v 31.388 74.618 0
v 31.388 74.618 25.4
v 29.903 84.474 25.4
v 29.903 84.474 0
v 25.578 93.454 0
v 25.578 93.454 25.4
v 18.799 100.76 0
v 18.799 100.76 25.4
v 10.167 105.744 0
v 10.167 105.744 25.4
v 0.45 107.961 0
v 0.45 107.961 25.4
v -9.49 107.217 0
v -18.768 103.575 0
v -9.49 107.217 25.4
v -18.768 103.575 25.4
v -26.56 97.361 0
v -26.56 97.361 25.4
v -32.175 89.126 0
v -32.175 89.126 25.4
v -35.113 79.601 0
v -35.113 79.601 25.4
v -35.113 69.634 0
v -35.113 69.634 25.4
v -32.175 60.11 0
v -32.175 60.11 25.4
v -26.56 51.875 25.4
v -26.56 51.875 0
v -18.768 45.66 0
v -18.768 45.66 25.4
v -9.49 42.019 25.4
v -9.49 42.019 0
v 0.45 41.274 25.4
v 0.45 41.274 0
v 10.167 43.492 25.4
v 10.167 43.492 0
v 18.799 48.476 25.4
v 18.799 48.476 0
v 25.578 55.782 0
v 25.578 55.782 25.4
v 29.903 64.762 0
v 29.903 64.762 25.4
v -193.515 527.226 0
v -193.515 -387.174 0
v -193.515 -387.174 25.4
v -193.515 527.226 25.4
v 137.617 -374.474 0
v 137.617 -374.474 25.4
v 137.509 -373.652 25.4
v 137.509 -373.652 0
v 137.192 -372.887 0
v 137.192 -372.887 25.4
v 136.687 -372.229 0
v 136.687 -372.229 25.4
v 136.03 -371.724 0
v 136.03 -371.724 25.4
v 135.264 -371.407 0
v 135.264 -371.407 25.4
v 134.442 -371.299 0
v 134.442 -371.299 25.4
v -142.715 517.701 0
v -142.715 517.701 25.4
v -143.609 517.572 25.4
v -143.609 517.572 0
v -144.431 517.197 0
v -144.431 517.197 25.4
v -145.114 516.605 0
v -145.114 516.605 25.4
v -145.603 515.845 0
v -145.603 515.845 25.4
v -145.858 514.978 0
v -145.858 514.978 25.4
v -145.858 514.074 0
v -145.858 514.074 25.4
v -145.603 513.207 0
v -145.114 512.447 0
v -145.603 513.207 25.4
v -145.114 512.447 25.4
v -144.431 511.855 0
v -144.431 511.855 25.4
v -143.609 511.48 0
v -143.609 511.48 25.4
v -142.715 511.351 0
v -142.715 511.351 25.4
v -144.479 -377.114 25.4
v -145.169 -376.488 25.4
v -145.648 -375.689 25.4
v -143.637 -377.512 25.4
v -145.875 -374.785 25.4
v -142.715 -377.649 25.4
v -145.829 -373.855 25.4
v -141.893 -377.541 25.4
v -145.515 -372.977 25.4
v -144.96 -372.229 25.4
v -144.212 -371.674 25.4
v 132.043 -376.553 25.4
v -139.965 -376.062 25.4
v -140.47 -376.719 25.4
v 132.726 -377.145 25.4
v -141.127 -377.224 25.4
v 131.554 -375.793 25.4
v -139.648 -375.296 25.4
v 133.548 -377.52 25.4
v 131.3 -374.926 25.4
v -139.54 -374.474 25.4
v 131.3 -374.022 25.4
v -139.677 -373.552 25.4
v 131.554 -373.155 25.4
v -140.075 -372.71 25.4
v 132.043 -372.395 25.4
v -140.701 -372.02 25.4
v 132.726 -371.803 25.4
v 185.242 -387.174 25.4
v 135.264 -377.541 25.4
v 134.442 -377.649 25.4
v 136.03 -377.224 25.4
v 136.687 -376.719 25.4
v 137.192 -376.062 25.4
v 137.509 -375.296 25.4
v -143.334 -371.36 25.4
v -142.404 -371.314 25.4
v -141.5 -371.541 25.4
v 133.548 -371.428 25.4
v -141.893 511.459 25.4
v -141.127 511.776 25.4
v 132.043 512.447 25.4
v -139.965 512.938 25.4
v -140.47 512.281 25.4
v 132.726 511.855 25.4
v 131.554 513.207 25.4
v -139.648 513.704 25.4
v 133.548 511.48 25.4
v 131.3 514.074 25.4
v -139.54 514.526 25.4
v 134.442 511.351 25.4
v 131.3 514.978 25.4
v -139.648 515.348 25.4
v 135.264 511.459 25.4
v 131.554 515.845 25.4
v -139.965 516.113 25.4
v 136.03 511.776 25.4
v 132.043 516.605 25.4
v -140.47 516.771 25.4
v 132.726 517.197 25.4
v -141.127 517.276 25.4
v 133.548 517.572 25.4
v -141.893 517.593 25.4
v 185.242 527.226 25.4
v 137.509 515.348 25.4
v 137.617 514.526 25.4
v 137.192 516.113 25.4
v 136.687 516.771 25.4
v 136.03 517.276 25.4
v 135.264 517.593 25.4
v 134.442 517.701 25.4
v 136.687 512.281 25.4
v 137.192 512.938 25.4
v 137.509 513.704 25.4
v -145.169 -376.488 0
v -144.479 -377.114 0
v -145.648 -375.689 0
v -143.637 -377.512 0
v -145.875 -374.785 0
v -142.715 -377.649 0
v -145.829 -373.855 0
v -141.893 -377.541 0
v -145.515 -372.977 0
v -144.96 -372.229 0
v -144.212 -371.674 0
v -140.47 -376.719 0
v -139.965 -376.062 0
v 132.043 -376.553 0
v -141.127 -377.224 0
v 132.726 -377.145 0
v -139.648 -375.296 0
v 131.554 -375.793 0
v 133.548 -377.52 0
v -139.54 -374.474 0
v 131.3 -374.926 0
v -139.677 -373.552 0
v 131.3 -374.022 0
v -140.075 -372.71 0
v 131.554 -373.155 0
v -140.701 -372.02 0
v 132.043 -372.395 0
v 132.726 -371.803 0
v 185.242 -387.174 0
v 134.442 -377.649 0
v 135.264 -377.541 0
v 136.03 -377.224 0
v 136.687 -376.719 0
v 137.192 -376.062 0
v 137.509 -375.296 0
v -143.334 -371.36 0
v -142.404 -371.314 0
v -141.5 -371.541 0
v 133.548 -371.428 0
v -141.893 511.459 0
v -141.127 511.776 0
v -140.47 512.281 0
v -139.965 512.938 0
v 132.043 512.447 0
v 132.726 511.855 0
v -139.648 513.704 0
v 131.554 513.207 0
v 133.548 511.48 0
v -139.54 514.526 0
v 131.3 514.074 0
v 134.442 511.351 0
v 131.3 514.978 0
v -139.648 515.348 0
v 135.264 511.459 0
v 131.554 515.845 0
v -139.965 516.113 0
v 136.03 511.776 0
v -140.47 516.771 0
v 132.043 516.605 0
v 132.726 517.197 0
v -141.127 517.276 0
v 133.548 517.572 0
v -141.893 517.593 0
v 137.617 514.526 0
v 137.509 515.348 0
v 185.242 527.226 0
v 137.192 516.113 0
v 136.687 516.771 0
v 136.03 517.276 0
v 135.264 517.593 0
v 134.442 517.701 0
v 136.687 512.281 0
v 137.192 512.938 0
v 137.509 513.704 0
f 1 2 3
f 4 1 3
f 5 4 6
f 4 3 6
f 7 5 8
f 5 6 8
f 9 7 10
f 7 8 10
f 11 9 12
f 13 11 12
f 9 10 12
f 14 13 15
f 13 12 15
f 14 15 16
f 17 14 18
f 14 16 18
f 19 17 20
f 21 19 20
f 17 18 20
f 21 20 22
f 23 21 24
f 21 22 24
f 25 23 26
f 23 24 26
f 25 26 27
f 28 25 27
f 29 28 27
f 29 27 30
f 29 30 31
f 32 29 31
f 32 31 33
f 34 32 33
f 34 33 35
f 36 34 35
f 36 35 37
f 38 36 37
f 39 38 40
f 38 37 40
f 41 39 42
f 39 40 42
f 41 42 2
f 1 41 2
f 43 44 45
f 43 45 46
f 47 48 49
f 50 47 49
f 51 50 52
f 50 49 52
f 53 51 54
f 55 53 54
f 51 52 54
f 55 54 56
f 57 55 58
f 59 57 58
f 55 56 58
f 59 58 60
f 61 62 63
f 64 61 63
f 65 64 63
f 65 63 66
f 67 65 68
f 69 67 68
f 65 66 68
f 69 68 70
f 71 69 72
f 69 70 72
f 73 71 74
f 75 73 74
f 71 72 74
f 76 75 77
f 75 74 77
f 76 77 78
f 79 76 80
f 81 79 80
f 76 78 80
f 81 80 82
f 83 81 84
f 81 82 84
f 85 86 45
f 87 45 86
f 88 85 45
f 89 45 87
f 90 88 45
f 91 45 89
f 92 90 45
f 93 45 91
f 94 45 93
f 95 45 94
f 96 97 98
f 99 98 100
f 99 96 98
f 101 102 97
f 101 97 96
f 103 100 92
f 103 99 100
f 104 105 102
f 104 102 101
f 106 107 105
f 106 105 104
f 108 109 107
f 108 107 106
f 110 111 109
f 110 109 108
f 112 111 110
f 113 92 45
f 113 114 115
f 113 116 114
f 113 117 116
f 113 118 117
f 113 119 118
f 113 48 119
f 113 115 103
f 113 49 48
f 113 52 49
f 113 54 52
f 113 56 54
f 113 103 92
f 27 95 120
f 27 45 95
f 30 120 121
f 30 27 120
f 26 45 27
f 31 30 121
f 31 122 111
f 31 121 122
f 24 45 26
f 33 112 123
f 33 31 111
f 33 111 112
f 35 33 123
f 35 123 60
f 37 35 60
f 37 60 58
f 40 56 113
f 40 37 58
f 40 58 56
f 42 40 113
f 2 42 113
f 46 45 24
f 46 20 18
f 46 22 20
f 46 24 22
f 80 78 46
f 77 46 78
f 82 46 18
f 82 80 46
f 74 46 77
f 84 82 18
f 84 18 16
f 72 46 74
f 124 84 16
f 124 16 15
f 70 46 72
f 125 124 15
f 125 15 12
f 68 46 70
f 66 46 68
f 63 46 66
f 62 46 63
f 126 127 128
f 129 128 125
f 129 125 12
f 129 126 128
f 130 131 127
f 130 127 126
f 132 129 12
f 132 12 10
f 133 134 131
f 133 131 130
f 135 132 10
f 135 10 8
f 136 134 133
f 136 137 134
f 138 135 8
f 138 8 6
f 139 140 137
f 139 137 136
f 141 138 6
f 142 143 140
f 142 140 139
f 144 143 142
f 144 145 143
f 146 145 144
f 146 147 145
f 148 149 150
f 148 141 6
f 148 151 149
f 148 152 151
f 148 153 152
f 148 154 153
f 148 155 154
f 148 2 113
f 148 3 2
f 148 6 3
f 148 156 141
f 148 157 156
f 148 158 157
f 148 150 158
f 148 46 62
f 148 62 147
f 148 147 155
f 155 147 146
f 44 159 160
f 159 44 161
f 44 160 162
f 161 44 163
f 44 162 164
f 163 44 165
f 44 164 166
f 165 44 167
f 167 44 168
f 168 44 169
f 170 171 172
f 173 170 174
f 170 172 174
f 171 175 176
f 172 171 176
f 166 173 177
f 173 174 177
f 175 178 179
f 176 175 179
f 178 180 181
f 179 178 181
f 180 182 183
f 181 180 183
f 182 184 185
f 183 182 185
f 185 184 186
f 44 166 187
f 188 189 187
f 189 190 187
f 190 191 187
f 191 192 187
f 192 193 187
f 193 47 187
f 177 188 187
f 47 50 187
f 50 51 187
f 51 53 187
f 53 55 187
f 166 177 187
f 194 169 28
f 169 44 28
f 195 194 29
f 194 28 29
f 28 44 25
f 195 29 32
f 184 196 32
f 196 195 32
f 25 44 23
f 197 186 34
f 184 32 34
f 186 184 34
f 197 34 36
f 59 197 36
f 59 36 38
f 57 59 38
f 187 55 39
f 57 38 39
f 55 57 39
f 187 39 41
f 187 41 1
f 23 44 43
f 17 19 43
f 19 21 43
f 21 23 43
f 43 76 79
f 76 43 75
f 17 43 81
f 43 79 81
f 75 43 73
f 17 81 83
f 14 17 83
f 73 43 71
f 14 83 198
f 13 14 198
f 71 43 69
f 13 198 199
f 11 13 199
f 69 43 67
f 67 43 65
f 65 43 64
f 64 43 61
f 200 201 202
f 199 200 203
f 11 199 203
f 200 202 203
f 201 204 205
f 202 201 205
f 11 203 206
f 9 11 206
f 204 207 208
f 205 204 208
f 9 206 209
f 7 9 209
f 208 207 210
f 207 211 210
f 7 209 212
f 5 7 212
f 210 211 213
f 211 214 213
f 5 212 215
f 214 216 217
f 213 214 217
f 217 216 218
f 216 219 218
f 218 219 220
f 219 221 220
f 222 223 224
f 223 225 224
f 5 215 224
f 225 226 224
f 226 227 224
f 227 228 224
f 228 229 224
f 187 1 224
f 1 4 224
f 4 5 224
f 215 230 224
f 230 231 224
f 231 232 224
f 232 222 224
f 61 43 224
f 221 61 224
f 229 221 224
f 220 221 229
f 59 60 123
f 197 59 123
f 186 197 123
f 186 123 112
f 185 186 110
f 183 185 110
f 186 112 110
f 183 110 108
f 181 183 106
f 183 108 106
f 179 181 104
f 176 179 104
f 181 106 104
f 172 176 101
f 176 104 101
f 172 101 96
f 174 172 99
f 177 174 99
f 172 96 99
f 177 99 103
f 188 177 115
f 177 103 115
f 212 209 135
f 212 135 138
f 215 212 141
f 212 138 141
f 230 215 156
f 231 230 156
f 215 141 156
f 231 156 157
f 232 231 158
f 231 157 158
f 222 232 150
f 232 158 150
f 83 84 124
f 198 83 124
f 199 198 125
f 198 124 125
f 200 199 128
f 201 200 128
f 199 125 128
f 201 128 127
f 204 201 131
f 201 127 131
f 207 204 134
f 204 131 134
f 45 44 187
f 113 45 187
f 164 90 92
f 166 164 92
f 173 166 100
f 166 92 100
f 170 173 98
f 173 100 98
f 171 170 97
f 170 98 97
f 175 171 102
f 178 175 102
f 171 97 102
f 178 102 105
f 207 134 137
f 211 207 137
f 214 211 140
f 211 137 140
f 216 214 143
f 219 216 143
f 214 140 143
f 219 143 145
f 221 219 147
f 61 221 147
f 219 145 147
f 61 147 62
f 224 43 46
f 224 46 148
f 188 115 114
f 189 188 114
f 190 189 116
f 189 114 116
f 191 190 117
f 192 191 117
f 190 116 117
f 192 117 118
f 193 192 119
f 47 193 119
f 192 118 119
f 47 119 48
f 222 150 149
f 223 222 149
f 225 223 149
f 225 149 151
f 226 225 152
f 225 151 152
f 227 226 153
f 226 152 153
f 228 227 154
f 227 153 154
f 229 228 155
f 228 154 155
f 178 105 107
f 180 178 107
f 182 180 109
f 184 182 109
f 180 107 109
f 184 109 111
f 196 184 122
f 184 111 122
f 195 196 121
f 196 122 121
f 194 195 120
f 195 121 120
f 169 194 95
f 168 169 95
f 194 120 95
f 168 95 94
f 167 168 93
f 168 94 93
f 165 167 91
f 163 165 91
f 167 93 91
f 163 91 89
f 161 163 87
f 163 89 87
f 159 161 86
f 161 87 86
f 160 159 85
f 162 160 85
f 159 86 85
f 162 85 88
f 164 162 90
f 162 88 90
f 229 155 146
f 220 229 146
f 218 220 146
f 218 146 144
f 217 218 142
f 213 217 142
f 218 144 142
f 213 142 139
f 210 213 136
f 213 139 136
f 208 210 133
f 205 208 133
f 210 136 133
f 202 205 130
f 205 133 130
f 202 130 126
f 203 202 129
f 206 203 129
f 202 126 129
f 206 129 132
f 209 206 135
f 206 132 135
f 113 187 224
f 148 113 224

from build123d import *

# Parameters (mm, degrees)
F0_W     = 378.75718
F0_H     = 914.4
F1_DEPTH = 25.4
F3_DEPTH = 25.401
F4_R     = 33.437192
F5_DEPTH = 25.4


with BuildPart() as f1:
    # F0 (on Top) → F1 (new body)
    with BuildSketch(Plane.XY):
        with Locations((-4.136321, 70.025934)):
            Rectangle(F0_W, F0_H)
    extrude(amount=F1_DEPTH)

    # F2 (on face) → F3 (cut, through all)
    with BuildSketch(Plane.XY.offset(25.4)):
        with BuildLine():
            Line((-142.714911, 514.525934), (-142.714911, 511.350934))
            ThreePointArc((-142.714911, 511.350934), (-140.469847, 512.28087), (-139.539911, 514.525934))
            ThreePointArc((-139.539911, 514.525934), (-140.469847, 516.770998), (-142.714911, 517.700934))
            Line((-142.714911, 517.700934), (-142.714911, 514.525934))
        make_face()
        with BuildLine():
            ThreePointArc((-142.714911, 517.700934), (-145.889911, 514.525934), (-142.714911, 511.350934))
            Line((-142.714911, 511.350934), (-142.714911, 514.525934))
            Line((-142.714911, 514.525934), (-142.714911, 517.700934))
        make_face()
        with BuildLine():
            Line((134.442269, 514.525934), (134.442269, 511.350934))
            ThreePointArc((134.442269, 511.350934), (136.687333, 512.28087), (137.617269, 514.525934))
            ThreePointArc((137.617269, 514.525934), (136.687333, 516.770998), (134.442269, 517.700934))
            Line((134.442269, 517.700934), (134.442269, 514.525934))
        make_face()
        with BuildLine():
            ThreePointArc((134.442269, 517.700934), (131.267269, 514.525934), (134.442269, 511.350934))
            Line((134.442269, 511.350934), (134.442269, 514.525934))
            Line((134.442269, 514.525934), (134.442269, 517.700934))
        make_face()
        with BuildLine():
            ThreePointArc((-142.714911, -377.649066), (-140.469847, -376.71913), (-139.539911, -374.474066))
            ThreePointArc((-139.539911, -374.474066), (-144.959975, -372.229002), (-142.714911, -377.649066))
        make_face()
        with BuildLine():
            ThreePointArc((134.442269, -377.649066), (136.687333, -376.71913), (137.617269, -374.474066))
            ThreePointArc((137.617269, -374.474066), (136.687333, -372.229002), (134.442269, -371.299066))
            Line((134.442269, -371.299066), (134.442269, -374.474066))
            Line((134.442269, -374.474066), (134.442269, -377.649066))
        make_face()
        with BuildLine():
            Line((134.442269, -374.474066), (134.442269, -371.299066))
            ThreePointArc((134.442269, -371.299066), (131.267269, -374.474066), (134.442269, -377.649066))
            Line((134.442269, -377.649066), (134.442269, -374.474066))
        make_face()
    extrude(amount=-F3_DEPTH, mode=Mode.SUBTRACT)

    # F4 (on face) → F5 (cut)
    with BuildSketch(Plane.XY.offset(25.4)):
        with Locations((-2.0491, 74.617796)):
            Circle(F4_R)
    extrude(amount=-F5_DEPTH, mode=Mode.SUBTRACT)


solid = f1.part
